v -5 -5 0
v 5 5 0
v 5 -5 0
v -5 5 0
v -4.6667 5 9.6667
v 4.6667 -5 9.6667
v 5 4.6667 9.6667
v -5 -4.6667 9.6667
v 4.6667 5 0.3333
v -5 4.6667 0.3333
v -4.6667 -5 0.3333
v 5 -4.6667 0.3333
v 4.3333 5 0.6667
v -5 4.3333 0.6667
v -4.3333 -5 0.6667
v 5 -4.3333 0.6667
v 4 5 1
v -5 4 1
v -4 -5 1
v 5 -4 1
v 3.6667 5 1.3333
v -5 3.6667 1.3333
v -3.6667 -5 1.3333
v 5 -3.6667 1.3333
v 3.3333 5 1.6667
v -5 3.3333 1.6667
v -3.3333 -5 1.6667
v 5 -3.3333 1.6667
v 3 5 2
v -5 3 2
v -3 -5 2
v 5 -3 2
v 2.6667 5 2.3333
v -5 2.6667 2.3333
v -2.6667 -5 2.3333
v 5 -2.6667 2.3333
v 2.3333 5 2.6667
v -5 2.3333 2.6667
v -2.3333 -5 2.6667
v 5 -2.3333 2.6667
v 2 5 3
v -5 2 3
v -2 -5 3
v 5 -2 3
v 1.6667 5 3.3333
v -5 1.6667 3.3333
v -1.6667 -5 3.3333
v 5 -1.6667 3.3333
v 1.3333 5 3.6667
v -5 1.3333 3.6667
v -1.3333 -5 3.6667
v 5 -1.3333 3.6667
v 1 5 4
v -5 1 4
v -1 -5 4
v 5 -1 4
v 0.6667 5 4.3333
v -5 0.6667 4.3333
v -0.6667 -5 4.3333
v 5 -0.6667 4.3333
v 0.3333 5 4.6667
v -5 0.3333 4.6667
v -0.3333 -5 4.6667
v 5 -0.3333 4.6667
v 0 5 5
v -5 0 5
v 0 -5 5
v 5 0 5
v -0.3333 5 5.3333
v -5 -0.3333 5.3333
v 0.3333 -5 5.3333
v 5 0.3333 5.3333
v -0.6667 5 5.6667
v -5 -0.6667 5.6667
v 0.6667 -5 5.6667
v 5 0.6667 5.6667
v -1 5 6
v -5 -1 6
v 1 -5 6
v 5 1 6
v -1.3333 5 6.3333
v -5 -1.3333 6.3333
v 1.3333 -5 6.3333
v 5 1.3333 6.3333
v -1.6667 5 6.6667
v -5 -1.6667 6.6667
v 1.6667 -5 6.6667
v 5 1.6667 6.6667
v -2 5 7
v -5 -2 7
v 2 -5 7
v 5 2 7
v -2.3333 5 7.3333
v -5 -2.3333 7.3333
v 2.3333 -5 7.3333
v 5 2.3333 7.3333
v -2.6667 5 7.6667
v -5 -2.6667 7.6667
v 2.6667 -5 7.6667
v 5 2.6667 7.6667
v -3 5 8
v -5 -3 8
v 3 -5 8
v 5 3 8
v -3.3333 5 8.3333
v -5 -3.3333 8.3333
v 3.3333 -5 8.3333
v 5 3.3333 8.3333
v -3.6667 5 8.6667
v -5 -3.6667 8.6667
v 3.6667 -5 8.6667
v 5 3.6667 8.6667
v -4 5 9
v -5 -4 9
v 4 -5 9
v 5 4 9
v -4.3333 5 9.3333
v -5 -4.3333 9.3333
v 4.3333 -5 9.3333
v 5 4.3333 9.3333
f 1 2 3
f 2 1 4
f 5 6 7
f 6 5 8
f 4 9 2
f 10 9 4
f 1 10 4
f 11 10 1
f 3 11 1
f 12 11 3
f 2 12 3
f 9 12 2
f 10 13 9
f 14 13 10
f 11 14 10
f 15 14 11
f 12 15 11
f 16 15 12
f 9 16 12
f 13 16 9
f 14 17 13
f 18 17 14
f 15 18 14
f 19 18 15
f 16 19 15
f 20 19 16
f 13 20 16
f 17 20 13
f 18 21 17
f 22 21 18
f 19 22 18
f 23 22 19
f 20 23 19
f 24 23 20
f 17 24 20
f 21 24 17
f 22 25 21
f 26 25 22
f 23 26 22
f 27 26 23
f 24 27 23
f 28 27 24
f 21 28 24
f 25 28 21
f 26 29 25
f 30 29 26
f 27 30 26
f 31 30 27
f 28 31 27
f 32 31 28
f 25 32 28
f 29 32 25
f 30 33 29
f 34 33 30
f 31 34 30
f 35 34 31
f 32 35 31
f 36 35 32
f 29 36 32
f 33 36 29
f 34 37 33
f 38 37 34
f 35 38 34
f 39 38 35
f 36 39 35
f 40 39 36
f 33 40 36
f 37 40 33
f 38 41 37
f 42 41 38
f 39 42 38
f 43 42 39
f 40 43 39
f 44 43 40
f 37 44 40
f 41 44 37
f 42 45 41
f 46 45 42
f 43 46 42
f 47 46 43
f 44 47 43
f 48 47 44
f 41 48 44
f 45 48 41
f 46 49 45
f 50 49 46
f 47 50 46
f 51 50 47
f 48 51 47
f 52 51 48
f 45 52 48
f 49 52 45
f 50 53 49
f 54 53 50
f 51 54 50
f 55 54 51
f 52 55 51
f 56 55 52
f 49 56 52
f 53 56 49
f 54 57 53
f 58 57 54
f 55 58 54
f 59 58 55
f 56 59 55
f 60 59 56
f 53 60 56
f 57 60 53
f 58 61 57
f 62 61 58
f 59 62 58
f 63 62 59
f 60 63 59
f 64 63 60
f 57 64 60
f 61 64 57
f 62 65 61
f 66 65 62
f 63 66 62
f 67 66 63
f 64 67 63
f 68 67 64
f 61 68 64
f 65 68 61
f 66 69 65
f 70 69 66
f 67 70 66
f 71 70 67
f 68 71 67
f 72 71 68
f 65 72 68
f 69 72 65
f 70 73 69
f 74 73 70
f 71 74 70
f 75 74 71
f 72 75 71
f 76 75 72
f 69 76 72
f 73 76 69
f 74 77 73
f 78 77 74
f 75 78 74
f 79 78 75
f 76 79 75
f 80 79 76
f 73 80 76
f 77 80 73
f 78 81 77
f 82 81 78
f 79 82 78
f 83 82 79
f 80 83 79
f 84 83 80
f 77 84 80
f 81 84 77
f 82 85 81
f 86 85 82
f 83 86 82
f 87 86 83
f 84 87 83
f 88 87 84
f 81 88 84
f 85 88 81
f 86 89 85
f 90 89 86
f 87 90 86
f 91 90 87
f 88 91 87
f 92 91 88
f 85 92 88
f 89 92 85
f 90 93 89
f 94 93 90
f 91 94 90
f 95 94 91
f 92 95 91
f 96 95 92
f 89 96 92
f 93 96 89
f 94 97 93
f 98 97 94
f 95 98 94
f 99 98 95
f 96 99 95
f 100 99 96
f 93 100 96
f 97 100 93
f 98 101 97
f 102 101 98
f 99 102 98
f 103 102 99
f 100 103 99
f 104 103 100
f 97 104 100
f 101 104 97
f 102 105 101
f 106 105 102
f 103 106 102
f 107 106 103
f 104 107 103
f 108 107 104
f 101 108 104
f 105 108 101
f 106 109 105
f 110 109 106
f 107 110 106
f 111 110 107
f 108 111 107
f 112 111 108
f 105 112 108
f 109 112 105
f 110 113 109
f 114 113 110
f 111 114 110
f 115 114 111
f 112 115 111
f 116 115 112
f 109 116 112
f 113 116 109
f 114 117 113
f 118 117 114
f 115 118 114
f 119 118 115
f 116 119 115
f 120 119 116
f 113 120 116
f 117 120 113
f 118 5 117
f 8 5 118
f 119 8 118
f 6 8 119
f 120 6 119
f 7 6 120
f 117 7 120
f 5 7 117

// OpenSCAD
// file: quickthread.scad
function _numSections(numTurns) = 1+numTurns*$fn;

extrusionNudge = 0.001;

function threadPoints(section,radius,numTurns,lead) =
    let (n=len(section),
        m=_numSections(numTurns)
        ) 
        [ for (i=[0:m-1]) for (j=[0:n-1]) 
            let (z=i/$fn*lead,
                angle=(i%$fn)/$fn*360,
                v=section[j])
            [ (radius+v[0])*cos(angle), (radius+v[0])*sin(angle),z+v[1]] ];
        
function mod(m,n) = let(mm = m%n) mm<0 ? n+mm : mm;
        
function extrusionPointIndex(pointsPerSection,sectionNumber,pointInSection) = pointsPerSection*sectionNumber + mod(pointInSection,pointsPerSection);
        
function _extrusionStartFace(pointsPerSection) = 
    [for (i=[0:pointsPerSection-1]) extrusionPointIndex(pointsPerSection,0,i)];
            
function _extrusionEndFace(pointsPerSection, numSections) = 
    [for (i=[pointsPerSection-1:-1:0]) extrusionPointIndex(pointsPerSection,numSections-1,i)];
                
function extrusionTubeFaces(pointsPerSection, numSections) =
            [for (i=[0:numSections-2]) for (j=[0:pointsPerSection-1]) for(tri=[0:1])
                tri==0 ? 
                    [extrusionPointIndex(pointsPerSection,i,j),extrusionPointIndex(pointsPerSection,i+1,j),extrusionPointIndex(pointsPerSection,i,j+1)] :
                    [extrusionPointIndex(pointsPerSection,i,j+1), extrusionPointIndex(pointsPerSection,i+1,j),
            extrusionPointIndex(pointsPerSection,i+1,j+1)]];
                
function extrusionFaces(pointsPerSection, numSections) = concat([_extrusionStartFace(pointsPerSection),_extrusionEndFace(pointsPerSection,numSections)],extrusionTubeFaces(pointsPerSection, numSections));

                    
module rawThread(profile, d=undef, h=10, lead=undef, $fn=72, adjustRadius=false, clip=true, includeCylinder=true) {
    radius = d/2;
    vSize = max([for(v1=profile) for(v2=profile) v2[1]-v1[1]]);
    vMin = min([for(v=profile) v[0]]);
    radiusAdjustment = adjustRadius ? vMin : 0;
    _lead = lead==undef ? vSize : lead;
    profileScale = vSize <= _lead-extrusionNudge ? 1 : (_lead-extrusionNudge)/vSize;
    adjProfile = [for(v=profile) [v[0]-radiusAdjustment,v[1]*profileScale]];
    adjRadius = radius + radiusAdjustment;
    hSize = 1+2*adjRadius + 2*max([for (v=adjProfile) v[0]]);
    numTurns = 2+ceil(h/_lead);
    render(convexity=10)
    union() {
        intersection() {
            if (clip)
                translate([-hSize/2,-hSize/2,0]) cube([hSize,hSize,h]);
            translate([0,0,-_lead]) polyhedron(faces=extrusionFaces(len(adjProfile), _numSections(numTurns)), points=threadPoints(
            adjProfile,adjRadius,numTurns,_lead));
        }
        if (includeCylinder) 
            cylinder(r=adjRadius+extrusionNudge,$fn=$fn,h=h);
    }
}

function inch_to_mm(x) = x * 25.4;

// internal = female
module isoThread(d=undef, dInch=undef, pitch=1, tpi=undef, h=1, hInch=undef, lead=undef, leadInch=undef, angle=30, internal=false, starts=1, $fn=72) {

    P = (tpi==undef) ? pitch : inch_to_mm(1/tpi);

    radius = dInch != undef ? inch_to_mm(dInch)/2 : d/2;    
    height = hInch != undef ? inch_to_mm(hInch) : h;
     
    Dmaj = 2*radius;
    H = P * cos(angle);
    
    _lead = leadInch != undef ? inch_to_mm(leadInch) : lead != undef ? lead : P;
    
    externalExtra=0.03;
    internalExtra=0.057;
    profile = !internal ? 
        [ [-H*externalExtra,(-3/8-externalExtra)*P], 
          [(5/8)*H,-P/16],[(5/8)*H,P/16], 
          [-H*externalExtra,(3/8+externalExtra)*pitch] ] :
        [ [0,-(3/8)*P], 
        [(5/8)*H,-P/16],[(5/8+internalExtra)*H,0],
        [(5/8)*H,P/16],[0,(3/8)*P] ];
    Dmin = Dmaj-2*5*H/8;
    myFN=$fn;
    for (i=[0:starts-1]) {
        rotate([0,0,360/starts*i]) rawThread(profile,d=Dmin,h=height,lead=_lead,$fn=myFN,adjustRadius=true);        
    }
}

//rawThread([[0,0],[1.5,1.5],[0,3]], d=50, h=91, pitch=3);
//rawThread([[0,0],[0,3],[3,3],[3,0]], d=50, h=50, pitch=6, $fn=80);
render(convexity=5)
difference() {
    isoThread(d=50,h=30,pitch=3,angle=40,internal=false,$fn=60);
    translate([0,0,-extrusionNudge]) isoThread(d=42,h=30+2*extrusionNudge,pitch=3,angle=40,internal=true,$fn=60);
}
//rawThread([[0,0],[1,0],[.5,.5],[1,1],[0,1]],r=20,h=10,lead=1.5);
// main file
use <quickthread.scad>;

numSlices = 30;
side = 10;
points = [for (i=[0:numSlices]) 
        let(t=i/numSlices, 
            d=side/2, 
            sq=[[d*(1-t)-d*t,d,side*t], [-d,d*(1-t)-d*t,side*t], [-d*(1-t)+d*t,-d,side*t], [d,-d*(1-t)+d*t,side*t]]) for (s=sq) s];
polyhedron(faces=extrusionFaces(4,numSlices),points=points);
